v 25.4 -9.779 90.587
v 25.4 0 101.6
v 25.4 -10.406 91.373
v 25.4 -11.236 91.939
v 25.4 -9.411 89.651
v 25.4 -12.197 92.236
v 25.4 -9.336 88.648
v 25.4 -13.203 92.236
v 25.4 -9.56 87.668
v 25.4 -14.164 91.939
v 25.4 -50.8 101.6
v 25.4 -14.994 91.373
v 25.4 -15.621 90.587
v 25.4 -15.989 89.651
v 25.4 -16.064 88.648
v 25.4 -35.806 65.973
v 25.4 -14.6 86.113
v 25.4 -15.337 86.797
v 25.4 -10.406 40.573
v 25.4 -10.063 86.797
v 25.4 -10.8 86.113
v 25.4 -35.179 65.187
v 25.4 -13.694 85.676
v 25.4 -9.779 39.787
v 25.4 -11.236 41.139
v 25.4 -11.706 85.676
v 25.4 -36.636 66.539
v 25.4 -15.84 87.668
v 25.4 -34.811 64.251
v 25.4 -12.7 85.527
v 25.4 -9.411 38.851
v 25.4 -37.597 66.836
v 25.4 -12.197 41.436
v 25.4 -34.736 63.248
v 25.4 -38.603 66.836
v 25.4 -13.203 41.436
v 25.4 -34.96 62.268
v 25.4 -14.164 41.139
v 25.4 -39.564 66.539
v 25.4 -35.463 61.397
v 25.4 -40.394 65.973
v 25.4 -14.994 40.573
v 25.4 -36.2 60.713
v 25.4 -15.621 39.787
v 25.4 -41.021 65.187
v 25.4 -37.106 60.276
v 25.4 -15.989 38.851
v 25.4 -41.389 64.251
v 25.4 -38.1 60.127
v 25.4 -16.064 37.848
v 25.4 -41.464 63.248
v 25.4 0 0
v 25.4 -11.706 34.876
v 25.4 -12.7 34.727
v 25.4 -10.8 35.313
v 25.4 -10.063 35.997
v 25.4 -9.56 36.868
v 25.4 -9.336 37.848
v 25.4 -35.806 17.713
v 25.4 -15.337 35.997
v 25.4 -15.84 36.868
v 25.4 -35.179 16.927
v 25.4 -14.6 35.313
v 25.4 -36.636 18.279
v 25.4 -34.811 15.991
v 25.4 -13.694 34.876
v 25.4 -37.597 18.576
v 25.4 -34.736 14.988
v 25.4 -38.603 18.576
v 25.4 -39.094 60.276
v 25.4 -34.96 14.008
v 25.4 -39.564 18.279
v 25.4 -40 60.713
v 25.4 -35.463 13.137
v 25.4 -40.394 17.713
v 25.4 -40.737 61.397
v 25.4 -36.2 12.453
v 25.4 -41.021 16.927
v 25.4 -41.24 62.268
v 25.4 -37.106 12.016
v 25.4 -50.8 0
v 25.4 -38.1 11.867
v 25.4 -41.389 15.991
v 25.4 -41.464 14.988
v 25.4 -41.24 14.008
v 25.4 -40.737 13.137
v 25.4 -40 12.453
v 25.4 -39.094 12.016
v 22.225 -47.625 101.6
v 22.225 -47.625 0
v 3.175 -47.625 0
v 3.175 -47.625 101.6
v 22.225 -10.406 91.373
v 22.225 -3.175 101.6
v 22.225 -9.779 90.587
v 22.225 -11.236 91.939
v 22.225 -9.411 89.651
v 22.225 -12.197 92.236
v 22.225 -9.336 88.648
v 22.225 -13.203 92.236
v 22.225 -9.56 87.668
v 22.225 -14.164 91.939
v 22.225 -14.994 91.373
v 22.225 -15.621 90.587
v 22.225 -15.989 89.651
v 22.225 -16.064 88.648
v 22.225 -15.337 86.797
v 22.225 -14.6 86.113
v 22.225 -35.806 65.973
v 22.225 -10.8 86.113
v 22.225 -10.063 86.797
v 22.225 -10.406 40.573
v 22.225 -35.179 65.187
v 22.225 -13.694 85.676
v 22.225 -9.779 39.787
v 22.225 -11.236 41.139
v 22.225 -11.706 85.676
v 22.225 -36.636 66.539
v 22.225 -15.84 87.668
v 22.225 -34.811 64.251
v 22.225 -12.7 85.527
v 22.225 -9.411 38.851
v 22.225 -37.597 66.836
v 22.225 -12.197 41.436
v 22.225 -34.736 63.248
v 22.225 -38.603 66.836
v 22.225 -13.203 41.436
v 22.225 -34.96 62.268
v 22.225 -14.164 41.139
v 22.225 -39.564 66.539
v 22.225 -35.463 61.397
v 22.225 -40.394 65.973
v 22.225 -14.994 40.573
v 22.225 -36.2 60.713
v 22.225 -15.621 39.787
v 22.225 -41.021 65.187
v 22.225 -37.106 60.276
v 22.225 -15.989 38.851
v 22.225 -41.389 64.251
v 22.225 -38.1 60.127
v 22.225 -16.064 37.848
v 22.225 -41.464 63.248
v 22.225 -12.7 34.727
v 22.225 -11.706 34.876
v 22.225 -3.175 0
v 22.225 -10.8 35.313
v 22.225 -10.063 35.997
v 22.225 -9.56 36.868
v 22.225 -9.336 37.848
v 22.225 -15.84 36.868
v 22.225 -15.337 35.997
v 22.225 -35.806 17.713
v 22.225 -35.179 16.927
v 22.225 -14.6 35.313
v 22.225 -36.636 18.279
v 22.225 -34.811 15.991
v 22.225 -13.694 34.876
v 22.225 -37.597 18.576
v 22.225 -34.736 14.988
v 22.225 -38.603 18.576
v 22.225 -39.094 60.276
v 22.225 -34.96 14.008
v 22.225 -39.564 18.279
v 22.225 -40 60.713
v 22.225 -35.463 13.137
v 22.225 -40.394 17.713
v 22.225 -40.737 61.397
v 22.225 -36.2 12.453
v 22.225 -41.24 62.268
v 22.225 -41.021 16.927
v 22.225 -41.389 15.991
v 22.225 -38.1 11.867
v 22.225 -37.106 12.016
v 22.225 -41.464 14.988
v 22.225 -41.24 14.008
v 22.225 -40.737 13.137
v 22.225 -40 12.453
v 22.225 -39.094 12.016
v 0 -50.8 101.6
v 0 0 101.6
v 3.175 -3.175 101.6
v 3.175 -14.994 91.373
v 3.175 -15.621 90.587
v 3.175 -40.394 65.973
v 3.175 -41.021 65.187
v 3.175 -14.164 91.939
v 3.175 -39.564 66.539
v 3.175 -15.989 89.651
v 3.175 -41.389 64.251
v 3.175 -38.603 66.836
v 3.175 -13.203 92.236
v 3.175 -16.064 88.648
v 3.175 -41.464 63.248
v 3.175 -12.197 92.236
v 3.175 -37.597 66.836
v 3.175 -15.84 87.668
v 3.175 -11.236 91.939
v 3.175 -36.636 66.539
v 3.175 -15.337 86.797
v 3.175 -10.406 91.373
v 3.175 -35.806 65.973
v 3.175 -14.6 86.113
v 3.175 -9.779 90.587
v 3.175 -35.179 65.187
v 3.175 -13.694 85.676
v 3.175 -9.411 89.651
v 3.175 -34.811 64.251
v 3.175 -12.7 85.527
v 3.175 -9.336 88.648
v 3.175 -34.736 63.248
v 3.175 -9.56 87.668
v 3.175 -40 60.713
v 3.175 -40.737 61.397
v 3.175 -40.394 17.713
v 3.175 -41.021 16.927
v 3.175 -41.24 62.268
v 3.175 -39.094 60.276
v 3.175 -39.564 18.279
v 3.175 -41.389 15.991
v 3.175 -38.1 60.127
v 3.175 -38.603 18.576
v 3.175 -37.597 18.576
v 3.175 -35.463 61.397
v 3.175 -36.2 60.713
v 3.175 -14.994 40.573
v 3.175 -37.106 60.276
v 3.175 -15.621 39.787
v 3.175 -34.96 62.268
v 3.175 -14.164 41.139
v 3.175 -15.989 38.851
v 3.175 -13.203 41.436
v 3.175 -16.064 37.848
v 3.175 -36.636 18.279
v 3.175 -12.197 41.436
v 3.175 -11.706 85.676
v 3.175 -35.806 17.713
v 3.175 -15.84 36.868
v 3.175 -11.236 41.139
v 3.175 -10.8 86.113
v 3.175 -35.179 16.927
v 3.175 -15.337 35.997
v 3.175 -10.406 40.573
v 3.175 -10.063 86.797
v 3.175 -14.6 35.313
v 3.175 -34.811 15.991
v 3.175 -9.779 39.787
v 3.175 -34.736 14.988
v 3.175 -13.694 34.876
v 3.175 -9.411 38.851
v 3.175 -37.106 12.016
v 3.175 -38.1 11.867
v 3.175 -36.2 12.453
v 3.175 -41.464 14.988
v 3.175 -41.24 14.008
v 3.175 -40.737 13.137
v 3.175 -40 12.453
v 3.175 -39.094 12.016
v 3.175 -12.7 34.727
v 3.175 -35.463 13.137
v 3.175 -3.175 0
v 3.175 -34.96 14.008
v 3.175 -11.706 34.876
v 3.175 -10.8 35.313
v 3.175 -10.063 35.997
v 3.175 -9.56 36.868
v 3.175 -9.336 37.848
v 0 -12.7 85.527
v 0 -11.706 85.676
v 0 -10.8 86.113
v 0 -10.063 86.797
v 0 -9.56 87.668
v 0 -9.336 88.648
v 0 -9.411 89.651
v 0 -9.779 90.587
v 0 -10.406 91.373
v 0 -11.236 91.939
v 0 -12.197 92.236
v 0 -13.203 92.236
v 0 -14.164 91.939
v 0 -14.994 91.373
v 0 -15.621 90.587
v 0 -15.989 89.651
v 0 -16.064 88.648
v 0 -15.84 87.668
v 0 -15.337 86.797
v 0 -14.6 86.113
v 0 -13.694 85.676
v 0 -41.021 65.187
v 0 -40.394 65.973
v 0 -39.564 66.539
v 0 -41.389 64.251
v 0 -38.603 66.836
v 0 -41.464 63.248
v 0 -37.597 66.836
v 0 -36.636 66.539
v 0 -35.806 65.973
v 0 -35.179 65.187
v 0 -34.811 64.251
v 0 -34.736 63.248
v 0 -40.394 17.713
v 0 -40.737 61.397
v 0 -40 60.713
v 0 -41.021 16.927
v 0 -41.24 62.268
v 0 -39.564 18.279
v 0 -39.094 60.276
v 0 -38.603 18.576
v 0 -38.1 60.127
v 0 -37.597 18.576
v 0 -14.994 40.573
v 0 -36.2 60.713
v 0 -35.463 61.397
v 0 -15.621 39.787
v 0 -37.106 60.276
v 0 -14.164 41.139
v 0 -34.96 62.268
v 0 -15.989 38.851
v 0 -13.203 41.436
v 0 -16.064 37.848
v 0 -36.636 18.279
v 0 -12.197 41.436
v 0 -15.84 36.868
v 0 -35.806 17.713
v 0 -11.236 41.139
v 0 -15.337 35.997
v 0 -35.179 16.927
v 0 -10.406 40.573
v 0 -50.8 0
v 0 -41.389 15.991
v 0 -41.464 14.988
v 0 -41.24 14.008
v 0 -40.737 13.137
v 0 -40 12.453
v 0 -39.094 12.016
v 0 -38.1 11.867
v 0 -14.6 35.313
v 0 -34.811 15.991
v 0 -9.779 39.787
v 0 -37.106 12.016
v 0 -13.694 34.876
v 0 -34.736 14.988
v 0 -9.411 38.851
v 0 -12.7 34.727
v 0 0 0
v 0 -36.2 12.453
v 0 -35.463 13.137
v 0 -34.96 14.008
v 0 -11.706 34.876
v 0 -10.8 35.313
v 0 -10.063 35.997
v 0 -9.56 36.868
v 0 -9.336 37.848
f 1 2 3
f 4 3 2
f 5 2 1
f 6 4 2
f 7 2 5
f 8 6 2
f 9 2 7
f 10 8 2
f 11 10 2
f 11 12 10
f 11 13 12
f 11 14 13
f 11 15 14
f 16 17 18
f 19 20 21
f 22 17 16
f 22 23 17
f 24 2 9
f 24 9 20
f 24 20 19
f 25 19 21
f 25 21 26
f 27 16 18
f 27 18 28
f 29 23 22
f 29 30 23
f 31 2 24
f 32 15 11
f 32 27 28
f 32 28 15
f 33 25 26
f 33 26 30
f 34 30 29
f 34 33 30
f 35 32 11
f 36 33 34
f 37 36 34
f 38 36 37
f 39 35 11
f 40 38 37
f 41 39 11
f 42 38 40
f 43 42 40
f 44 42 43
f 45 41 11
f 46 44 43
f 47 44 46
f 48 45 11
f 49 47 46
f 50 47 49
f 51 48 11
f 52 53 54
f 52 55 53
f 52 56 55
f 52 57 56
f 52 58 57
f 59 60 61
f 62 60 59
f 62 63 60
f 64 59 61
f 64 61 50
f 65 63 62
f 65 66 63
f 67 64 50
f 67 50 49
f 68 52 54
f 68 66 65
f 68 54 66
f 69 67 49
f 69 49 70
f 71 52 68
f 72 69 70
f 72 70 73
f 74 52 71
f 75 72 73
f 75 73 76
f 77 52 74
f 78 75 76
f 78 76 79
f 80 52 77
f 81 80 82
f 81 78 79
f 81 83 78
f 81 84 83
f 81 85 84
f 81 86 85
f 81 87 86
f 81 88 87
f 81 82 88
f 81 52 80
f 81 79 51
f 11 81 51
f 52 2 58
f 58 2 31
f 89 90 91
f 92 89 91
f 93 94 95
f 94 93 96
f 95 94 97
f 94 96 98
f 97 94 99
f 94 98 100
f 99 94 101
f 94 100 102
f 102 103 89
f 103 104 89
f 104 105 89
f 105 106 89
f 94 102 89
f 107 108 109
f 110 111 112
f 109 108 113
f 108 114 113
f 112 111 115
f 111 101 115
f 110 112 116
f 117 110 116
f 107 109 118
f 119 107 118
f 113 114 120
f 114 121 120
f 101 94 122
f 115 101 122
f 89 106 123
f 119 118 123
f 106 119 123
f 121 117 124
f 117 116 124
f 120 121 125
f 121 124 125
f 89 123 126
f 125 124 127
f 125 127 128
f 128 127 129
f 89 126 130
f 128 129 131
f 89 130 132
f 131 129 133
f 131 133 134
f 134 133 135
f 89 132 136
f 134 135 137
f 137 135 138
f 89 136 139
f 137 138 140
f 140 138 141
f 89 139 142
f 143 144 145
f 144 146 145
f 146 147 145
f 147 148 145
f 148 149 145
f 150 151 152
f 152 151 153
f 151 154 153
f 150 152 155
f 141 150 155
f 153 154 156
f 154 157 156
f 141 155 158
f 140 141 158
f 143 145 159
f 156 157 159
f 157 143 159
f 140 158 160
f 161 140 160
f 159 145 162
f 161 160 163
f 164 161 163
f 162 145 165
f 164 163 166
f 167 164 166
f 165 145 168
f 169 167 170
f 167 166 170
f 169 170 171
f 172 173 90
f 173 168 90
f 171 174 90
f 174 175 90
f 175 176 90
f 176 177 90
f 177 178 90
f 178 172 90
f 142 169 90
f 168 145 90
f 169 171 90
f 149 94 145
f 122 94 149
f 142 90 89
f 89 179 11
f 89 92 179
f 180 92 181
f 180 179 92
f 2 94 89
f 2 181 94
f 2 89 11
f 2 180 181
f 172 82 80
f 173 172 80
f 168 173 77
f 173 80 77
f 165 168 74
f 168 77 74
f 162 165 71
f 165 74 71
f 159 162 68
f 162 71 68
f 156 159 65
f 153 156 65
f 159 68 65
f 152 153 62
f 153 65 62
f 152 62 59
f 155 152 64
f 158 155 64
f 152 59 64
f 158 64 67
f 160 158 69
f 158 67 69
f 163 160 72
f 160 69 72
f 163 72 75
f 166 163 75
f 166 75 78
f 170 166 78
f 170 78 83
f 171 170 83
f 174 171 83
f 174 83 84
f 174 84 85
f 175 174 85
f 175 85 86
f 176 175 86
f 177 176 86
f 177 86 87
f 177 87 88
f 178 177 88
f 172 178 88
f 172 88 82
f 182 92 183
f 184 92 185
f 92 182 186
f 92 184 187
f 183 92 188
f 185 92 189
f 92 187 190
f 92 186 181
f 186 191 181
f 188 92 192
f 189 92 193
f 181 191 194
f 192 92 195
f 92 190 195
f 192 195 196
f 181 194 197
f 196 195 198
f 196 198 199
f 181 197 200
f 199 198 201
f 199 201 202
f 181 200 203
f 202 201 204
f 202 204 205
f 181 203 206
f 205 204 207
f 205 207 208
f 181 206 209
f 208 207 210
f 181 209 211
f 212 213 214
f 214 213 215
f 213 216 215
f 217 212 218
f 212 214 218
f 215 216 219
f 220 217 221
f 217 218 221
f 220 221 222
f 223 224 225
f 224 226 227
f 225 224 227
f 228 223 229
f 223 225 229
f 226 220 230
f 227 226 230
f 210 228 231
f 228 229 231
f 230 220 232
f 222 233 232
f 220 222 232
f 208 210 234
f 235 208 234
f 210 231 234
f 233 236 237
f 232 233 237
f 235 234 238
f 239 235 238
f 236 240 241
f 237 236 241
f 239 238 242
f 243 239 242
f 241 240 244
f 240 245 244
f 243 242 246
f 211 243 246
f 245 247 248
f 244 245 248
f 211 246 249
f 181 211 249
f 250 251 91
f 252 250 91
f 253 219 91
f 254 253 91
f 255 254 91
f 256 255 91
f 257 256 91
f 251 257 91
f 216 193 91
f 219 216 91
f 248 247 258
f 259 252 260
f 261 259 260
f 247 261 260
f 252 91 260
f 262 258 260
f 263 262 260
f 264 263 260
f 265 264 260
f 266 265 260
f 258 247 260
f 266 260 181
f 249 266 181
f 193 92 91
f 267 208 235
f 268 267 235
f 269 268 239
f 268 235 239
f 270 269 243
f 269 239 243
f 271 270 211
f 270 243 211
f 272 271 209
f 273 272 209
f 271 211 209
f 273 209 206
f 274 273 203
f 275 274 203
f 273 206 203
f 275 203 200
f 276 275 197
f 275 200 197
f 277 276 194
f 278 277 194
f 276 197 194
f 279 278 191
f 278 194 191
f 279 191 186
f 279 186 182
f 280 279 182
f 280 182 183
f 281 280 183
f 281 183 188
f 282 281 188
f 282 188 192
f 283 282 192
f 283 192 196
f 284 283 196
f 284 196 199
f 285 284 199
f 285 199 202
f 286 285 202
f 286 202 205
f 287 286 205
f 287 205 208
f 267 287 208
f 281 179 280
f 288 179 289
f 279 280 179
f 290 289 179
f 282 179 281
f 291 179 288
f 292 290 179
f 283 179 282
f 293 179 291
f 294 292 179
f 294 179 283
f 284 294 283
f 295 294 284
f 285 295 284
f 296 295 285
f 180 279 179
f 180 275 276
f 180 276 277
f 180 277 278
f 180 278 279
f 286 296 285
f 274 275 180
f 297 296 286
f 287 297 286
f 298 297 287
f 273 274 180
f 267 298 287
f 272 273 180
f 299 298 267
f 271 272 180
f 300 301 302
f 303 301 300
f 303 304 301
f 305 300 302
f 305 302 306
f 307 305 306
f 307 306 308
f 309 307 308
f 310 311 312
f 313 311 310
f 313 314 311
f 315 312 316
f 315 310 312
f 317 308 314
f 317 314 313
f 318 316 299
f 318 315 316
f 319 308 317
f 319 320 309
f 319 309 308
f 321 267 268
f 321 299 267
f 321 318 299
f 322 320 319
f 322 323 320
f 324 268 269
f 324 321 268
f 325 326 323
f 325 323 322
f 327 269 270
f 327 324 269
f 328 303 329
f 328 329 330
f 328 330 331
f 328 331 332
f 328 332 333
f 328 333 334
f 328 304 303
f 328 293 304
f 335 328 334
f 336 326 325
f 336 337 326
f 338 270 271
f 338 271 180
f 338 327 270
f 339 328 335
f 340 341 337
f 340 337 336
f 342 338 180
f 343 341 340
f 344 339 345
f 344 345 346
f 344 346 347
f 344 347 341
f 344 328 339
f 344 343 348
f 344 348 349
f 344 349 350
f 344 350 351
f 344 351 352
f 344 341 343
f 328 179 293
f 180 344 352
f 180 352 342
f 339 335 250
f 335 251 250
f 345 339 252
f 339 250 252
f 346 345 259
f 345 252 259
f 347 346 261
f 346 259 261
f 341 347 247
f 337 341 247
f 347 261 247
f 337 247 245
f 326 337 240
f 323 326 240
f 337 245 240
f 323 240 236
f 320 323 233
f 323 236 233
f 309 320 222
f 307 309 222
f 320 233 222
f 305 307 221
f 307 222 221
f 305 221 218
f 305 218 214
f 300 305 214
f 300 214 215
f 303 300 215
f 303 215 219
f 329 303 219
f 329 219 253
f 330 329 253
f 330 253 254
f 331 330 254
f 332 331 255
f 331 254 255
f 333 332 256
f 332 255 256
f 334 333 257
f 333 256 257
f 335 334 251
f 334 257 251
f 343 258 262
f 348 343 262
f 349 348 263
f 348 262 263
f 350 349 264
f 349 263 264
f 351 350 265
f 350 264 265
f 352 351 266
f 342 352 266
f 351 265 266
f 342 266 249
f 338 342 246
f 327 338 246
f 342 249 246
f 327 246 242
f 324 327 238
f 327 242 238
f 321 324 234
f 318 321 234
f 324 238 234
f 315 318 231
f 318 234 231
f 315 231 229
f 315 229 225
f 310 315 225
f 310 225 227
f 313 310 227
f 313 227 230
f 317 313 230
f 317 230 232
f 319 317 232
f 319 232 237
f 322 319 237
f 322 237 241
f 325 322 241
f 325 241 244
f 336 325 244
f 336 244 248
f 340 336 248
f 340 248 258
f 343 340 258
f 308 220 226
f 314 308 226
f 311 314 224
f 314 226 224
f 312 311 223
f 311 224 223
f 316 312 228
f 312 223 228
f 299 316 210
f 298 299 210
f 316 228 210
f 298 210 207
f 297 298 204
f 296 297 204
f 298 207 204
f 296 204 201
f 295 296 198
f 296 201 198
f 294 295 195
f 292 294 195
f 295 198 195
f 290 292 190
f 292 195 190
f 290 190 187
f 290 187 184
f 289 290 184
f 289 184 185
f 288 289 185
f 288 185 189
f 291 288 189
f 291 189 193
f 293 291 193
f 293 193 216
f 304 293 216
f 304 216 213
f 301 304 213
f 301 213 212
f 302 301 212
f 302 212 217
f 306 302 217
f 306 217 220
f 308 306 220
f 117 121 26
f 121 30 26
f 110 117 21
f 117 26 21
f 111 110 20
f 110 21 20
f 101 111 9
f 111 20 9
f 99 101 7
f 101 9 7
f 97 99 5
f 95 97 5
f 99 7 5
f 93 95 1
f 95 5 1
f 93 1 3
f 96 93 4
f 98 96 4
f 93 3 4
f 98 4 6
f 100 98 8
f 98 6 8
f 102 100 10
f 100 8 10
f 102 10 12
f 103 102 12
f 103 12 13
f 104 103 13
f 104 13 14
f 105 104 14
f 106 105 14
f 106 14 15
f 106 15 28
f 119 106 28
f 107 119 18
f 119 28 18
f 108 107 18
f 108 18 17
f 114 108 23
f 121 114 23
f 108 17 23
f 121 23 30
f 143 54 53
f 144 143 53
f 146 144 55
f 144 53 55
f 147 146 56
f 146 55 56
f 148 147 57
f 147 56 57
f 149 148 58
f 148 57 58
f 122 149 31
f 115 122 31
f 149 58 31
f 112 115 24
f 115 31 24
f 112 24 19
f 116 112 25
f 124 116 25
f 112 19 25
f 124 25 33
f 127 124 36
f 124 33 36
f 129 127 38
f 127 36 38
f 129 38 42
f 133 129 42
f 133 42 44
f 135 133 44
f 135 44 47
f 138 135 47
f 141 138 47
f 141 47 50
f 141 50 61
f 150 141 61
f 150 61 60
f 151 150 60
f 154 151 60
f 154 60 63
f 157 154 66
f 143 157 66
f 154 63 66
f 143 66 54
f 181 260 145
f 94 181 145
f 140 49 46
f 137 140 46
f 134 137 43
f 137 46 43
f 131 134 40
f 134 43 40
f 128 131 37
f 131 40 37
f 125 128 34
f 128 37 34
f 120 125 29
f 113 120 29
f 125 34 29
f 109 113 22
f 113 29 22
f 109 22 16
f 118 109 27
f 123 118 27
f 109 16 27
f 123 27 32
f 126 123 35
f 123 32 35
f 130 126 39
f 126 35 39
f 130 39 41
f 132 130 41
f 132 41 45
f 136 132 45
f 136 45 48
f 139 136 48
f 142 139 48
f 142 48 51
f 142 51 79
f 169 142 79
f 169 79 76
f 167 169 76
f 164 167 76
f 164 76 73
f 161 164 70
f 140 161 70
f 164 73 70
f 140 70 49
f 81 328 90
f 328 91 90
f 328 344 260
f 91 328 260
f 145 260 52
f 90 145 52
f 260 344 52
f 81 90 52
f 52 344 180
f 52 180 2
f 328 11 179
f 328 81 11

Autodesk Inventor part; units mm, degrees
ref_plane "YZ Plane" through (0, 0, 0) normal (1, 0, 0) x (0, 1, 0)
ref_plane "XZ Plane" through (0, 0, 0) normal (0, 1, 0) x (-1, 0, 0)
ref_plane "XY Plane" through (0, 0, 0) normal (0, 0, 1) x (1, 0, 0)
sketch "Sketch1" plane through (0, 0, 0) normal (0, 0, 1) x (1, 0, 0)
  line L0 (0, 0) -> (25.4, 0)
  line L1 (25.4, 0) -> (25.4, -50.8)
  line L2 (25.4, -50.8) -> (0, -50.8)
  line L3 (0, -50.8) -> (0, 0)
  line L4 (3.175, -3.175) -> (22.225, -3.175)
  line L5 (22.225, -3.175) -> (22.225, -47.625)
  line L6 (22.225, -47.625) -> (3.175, -47.625)
  line L7 (3.175, -47.625) -> (3.175, -3.175)
  dimension "d0" = 25.4
  dimension "d1" = 50.8
  dimension "d2" = 3.175
  dimension "d3" = 3.175
  dimension "d4" = 3.175
  dimension "d5" = 3.175
extrude "Extrusion1" add sketch "Sketch1" along normal blind 101.6
sketch "Sketch2" plane through (25.4, -50.8, 0) normal (1, 0, 0) x (0, 0, -1)
  circle A0 centre (-63.5, 12.7) radius 3.3734
  line L0 (0, 50.8) -> (0, 0) projected
  line L1 (0, 50.8) -> (-101.6, 50.8) projected
  circle A1 centre (-88.9, 38.1) radius 3.3734
  circle A2 centre (-38.1, 38.1) radius 3.3734
  circle A3 centre (-15.24, 12.7) radius 3.3734
  line L2 (0, 0) -> (-101.6, 0) projected
  dimension "d8" = 6.7469
  dimension "d12" = 63.5
  dimension "d13" = 88.9
  dimension "d14" = 12.7
  dimension "d17" = 38.1
  dimension "d27" = 15.24
  dimension "d28" = 12.7
  dimension "d29" = 38.1
  dimension "d30" = 12.7
extrude "Extrusion3" cut sketch "Sketch2" against normal blind 25.4
properties part number "flywheelsupport" material "Aluminum 6061"
